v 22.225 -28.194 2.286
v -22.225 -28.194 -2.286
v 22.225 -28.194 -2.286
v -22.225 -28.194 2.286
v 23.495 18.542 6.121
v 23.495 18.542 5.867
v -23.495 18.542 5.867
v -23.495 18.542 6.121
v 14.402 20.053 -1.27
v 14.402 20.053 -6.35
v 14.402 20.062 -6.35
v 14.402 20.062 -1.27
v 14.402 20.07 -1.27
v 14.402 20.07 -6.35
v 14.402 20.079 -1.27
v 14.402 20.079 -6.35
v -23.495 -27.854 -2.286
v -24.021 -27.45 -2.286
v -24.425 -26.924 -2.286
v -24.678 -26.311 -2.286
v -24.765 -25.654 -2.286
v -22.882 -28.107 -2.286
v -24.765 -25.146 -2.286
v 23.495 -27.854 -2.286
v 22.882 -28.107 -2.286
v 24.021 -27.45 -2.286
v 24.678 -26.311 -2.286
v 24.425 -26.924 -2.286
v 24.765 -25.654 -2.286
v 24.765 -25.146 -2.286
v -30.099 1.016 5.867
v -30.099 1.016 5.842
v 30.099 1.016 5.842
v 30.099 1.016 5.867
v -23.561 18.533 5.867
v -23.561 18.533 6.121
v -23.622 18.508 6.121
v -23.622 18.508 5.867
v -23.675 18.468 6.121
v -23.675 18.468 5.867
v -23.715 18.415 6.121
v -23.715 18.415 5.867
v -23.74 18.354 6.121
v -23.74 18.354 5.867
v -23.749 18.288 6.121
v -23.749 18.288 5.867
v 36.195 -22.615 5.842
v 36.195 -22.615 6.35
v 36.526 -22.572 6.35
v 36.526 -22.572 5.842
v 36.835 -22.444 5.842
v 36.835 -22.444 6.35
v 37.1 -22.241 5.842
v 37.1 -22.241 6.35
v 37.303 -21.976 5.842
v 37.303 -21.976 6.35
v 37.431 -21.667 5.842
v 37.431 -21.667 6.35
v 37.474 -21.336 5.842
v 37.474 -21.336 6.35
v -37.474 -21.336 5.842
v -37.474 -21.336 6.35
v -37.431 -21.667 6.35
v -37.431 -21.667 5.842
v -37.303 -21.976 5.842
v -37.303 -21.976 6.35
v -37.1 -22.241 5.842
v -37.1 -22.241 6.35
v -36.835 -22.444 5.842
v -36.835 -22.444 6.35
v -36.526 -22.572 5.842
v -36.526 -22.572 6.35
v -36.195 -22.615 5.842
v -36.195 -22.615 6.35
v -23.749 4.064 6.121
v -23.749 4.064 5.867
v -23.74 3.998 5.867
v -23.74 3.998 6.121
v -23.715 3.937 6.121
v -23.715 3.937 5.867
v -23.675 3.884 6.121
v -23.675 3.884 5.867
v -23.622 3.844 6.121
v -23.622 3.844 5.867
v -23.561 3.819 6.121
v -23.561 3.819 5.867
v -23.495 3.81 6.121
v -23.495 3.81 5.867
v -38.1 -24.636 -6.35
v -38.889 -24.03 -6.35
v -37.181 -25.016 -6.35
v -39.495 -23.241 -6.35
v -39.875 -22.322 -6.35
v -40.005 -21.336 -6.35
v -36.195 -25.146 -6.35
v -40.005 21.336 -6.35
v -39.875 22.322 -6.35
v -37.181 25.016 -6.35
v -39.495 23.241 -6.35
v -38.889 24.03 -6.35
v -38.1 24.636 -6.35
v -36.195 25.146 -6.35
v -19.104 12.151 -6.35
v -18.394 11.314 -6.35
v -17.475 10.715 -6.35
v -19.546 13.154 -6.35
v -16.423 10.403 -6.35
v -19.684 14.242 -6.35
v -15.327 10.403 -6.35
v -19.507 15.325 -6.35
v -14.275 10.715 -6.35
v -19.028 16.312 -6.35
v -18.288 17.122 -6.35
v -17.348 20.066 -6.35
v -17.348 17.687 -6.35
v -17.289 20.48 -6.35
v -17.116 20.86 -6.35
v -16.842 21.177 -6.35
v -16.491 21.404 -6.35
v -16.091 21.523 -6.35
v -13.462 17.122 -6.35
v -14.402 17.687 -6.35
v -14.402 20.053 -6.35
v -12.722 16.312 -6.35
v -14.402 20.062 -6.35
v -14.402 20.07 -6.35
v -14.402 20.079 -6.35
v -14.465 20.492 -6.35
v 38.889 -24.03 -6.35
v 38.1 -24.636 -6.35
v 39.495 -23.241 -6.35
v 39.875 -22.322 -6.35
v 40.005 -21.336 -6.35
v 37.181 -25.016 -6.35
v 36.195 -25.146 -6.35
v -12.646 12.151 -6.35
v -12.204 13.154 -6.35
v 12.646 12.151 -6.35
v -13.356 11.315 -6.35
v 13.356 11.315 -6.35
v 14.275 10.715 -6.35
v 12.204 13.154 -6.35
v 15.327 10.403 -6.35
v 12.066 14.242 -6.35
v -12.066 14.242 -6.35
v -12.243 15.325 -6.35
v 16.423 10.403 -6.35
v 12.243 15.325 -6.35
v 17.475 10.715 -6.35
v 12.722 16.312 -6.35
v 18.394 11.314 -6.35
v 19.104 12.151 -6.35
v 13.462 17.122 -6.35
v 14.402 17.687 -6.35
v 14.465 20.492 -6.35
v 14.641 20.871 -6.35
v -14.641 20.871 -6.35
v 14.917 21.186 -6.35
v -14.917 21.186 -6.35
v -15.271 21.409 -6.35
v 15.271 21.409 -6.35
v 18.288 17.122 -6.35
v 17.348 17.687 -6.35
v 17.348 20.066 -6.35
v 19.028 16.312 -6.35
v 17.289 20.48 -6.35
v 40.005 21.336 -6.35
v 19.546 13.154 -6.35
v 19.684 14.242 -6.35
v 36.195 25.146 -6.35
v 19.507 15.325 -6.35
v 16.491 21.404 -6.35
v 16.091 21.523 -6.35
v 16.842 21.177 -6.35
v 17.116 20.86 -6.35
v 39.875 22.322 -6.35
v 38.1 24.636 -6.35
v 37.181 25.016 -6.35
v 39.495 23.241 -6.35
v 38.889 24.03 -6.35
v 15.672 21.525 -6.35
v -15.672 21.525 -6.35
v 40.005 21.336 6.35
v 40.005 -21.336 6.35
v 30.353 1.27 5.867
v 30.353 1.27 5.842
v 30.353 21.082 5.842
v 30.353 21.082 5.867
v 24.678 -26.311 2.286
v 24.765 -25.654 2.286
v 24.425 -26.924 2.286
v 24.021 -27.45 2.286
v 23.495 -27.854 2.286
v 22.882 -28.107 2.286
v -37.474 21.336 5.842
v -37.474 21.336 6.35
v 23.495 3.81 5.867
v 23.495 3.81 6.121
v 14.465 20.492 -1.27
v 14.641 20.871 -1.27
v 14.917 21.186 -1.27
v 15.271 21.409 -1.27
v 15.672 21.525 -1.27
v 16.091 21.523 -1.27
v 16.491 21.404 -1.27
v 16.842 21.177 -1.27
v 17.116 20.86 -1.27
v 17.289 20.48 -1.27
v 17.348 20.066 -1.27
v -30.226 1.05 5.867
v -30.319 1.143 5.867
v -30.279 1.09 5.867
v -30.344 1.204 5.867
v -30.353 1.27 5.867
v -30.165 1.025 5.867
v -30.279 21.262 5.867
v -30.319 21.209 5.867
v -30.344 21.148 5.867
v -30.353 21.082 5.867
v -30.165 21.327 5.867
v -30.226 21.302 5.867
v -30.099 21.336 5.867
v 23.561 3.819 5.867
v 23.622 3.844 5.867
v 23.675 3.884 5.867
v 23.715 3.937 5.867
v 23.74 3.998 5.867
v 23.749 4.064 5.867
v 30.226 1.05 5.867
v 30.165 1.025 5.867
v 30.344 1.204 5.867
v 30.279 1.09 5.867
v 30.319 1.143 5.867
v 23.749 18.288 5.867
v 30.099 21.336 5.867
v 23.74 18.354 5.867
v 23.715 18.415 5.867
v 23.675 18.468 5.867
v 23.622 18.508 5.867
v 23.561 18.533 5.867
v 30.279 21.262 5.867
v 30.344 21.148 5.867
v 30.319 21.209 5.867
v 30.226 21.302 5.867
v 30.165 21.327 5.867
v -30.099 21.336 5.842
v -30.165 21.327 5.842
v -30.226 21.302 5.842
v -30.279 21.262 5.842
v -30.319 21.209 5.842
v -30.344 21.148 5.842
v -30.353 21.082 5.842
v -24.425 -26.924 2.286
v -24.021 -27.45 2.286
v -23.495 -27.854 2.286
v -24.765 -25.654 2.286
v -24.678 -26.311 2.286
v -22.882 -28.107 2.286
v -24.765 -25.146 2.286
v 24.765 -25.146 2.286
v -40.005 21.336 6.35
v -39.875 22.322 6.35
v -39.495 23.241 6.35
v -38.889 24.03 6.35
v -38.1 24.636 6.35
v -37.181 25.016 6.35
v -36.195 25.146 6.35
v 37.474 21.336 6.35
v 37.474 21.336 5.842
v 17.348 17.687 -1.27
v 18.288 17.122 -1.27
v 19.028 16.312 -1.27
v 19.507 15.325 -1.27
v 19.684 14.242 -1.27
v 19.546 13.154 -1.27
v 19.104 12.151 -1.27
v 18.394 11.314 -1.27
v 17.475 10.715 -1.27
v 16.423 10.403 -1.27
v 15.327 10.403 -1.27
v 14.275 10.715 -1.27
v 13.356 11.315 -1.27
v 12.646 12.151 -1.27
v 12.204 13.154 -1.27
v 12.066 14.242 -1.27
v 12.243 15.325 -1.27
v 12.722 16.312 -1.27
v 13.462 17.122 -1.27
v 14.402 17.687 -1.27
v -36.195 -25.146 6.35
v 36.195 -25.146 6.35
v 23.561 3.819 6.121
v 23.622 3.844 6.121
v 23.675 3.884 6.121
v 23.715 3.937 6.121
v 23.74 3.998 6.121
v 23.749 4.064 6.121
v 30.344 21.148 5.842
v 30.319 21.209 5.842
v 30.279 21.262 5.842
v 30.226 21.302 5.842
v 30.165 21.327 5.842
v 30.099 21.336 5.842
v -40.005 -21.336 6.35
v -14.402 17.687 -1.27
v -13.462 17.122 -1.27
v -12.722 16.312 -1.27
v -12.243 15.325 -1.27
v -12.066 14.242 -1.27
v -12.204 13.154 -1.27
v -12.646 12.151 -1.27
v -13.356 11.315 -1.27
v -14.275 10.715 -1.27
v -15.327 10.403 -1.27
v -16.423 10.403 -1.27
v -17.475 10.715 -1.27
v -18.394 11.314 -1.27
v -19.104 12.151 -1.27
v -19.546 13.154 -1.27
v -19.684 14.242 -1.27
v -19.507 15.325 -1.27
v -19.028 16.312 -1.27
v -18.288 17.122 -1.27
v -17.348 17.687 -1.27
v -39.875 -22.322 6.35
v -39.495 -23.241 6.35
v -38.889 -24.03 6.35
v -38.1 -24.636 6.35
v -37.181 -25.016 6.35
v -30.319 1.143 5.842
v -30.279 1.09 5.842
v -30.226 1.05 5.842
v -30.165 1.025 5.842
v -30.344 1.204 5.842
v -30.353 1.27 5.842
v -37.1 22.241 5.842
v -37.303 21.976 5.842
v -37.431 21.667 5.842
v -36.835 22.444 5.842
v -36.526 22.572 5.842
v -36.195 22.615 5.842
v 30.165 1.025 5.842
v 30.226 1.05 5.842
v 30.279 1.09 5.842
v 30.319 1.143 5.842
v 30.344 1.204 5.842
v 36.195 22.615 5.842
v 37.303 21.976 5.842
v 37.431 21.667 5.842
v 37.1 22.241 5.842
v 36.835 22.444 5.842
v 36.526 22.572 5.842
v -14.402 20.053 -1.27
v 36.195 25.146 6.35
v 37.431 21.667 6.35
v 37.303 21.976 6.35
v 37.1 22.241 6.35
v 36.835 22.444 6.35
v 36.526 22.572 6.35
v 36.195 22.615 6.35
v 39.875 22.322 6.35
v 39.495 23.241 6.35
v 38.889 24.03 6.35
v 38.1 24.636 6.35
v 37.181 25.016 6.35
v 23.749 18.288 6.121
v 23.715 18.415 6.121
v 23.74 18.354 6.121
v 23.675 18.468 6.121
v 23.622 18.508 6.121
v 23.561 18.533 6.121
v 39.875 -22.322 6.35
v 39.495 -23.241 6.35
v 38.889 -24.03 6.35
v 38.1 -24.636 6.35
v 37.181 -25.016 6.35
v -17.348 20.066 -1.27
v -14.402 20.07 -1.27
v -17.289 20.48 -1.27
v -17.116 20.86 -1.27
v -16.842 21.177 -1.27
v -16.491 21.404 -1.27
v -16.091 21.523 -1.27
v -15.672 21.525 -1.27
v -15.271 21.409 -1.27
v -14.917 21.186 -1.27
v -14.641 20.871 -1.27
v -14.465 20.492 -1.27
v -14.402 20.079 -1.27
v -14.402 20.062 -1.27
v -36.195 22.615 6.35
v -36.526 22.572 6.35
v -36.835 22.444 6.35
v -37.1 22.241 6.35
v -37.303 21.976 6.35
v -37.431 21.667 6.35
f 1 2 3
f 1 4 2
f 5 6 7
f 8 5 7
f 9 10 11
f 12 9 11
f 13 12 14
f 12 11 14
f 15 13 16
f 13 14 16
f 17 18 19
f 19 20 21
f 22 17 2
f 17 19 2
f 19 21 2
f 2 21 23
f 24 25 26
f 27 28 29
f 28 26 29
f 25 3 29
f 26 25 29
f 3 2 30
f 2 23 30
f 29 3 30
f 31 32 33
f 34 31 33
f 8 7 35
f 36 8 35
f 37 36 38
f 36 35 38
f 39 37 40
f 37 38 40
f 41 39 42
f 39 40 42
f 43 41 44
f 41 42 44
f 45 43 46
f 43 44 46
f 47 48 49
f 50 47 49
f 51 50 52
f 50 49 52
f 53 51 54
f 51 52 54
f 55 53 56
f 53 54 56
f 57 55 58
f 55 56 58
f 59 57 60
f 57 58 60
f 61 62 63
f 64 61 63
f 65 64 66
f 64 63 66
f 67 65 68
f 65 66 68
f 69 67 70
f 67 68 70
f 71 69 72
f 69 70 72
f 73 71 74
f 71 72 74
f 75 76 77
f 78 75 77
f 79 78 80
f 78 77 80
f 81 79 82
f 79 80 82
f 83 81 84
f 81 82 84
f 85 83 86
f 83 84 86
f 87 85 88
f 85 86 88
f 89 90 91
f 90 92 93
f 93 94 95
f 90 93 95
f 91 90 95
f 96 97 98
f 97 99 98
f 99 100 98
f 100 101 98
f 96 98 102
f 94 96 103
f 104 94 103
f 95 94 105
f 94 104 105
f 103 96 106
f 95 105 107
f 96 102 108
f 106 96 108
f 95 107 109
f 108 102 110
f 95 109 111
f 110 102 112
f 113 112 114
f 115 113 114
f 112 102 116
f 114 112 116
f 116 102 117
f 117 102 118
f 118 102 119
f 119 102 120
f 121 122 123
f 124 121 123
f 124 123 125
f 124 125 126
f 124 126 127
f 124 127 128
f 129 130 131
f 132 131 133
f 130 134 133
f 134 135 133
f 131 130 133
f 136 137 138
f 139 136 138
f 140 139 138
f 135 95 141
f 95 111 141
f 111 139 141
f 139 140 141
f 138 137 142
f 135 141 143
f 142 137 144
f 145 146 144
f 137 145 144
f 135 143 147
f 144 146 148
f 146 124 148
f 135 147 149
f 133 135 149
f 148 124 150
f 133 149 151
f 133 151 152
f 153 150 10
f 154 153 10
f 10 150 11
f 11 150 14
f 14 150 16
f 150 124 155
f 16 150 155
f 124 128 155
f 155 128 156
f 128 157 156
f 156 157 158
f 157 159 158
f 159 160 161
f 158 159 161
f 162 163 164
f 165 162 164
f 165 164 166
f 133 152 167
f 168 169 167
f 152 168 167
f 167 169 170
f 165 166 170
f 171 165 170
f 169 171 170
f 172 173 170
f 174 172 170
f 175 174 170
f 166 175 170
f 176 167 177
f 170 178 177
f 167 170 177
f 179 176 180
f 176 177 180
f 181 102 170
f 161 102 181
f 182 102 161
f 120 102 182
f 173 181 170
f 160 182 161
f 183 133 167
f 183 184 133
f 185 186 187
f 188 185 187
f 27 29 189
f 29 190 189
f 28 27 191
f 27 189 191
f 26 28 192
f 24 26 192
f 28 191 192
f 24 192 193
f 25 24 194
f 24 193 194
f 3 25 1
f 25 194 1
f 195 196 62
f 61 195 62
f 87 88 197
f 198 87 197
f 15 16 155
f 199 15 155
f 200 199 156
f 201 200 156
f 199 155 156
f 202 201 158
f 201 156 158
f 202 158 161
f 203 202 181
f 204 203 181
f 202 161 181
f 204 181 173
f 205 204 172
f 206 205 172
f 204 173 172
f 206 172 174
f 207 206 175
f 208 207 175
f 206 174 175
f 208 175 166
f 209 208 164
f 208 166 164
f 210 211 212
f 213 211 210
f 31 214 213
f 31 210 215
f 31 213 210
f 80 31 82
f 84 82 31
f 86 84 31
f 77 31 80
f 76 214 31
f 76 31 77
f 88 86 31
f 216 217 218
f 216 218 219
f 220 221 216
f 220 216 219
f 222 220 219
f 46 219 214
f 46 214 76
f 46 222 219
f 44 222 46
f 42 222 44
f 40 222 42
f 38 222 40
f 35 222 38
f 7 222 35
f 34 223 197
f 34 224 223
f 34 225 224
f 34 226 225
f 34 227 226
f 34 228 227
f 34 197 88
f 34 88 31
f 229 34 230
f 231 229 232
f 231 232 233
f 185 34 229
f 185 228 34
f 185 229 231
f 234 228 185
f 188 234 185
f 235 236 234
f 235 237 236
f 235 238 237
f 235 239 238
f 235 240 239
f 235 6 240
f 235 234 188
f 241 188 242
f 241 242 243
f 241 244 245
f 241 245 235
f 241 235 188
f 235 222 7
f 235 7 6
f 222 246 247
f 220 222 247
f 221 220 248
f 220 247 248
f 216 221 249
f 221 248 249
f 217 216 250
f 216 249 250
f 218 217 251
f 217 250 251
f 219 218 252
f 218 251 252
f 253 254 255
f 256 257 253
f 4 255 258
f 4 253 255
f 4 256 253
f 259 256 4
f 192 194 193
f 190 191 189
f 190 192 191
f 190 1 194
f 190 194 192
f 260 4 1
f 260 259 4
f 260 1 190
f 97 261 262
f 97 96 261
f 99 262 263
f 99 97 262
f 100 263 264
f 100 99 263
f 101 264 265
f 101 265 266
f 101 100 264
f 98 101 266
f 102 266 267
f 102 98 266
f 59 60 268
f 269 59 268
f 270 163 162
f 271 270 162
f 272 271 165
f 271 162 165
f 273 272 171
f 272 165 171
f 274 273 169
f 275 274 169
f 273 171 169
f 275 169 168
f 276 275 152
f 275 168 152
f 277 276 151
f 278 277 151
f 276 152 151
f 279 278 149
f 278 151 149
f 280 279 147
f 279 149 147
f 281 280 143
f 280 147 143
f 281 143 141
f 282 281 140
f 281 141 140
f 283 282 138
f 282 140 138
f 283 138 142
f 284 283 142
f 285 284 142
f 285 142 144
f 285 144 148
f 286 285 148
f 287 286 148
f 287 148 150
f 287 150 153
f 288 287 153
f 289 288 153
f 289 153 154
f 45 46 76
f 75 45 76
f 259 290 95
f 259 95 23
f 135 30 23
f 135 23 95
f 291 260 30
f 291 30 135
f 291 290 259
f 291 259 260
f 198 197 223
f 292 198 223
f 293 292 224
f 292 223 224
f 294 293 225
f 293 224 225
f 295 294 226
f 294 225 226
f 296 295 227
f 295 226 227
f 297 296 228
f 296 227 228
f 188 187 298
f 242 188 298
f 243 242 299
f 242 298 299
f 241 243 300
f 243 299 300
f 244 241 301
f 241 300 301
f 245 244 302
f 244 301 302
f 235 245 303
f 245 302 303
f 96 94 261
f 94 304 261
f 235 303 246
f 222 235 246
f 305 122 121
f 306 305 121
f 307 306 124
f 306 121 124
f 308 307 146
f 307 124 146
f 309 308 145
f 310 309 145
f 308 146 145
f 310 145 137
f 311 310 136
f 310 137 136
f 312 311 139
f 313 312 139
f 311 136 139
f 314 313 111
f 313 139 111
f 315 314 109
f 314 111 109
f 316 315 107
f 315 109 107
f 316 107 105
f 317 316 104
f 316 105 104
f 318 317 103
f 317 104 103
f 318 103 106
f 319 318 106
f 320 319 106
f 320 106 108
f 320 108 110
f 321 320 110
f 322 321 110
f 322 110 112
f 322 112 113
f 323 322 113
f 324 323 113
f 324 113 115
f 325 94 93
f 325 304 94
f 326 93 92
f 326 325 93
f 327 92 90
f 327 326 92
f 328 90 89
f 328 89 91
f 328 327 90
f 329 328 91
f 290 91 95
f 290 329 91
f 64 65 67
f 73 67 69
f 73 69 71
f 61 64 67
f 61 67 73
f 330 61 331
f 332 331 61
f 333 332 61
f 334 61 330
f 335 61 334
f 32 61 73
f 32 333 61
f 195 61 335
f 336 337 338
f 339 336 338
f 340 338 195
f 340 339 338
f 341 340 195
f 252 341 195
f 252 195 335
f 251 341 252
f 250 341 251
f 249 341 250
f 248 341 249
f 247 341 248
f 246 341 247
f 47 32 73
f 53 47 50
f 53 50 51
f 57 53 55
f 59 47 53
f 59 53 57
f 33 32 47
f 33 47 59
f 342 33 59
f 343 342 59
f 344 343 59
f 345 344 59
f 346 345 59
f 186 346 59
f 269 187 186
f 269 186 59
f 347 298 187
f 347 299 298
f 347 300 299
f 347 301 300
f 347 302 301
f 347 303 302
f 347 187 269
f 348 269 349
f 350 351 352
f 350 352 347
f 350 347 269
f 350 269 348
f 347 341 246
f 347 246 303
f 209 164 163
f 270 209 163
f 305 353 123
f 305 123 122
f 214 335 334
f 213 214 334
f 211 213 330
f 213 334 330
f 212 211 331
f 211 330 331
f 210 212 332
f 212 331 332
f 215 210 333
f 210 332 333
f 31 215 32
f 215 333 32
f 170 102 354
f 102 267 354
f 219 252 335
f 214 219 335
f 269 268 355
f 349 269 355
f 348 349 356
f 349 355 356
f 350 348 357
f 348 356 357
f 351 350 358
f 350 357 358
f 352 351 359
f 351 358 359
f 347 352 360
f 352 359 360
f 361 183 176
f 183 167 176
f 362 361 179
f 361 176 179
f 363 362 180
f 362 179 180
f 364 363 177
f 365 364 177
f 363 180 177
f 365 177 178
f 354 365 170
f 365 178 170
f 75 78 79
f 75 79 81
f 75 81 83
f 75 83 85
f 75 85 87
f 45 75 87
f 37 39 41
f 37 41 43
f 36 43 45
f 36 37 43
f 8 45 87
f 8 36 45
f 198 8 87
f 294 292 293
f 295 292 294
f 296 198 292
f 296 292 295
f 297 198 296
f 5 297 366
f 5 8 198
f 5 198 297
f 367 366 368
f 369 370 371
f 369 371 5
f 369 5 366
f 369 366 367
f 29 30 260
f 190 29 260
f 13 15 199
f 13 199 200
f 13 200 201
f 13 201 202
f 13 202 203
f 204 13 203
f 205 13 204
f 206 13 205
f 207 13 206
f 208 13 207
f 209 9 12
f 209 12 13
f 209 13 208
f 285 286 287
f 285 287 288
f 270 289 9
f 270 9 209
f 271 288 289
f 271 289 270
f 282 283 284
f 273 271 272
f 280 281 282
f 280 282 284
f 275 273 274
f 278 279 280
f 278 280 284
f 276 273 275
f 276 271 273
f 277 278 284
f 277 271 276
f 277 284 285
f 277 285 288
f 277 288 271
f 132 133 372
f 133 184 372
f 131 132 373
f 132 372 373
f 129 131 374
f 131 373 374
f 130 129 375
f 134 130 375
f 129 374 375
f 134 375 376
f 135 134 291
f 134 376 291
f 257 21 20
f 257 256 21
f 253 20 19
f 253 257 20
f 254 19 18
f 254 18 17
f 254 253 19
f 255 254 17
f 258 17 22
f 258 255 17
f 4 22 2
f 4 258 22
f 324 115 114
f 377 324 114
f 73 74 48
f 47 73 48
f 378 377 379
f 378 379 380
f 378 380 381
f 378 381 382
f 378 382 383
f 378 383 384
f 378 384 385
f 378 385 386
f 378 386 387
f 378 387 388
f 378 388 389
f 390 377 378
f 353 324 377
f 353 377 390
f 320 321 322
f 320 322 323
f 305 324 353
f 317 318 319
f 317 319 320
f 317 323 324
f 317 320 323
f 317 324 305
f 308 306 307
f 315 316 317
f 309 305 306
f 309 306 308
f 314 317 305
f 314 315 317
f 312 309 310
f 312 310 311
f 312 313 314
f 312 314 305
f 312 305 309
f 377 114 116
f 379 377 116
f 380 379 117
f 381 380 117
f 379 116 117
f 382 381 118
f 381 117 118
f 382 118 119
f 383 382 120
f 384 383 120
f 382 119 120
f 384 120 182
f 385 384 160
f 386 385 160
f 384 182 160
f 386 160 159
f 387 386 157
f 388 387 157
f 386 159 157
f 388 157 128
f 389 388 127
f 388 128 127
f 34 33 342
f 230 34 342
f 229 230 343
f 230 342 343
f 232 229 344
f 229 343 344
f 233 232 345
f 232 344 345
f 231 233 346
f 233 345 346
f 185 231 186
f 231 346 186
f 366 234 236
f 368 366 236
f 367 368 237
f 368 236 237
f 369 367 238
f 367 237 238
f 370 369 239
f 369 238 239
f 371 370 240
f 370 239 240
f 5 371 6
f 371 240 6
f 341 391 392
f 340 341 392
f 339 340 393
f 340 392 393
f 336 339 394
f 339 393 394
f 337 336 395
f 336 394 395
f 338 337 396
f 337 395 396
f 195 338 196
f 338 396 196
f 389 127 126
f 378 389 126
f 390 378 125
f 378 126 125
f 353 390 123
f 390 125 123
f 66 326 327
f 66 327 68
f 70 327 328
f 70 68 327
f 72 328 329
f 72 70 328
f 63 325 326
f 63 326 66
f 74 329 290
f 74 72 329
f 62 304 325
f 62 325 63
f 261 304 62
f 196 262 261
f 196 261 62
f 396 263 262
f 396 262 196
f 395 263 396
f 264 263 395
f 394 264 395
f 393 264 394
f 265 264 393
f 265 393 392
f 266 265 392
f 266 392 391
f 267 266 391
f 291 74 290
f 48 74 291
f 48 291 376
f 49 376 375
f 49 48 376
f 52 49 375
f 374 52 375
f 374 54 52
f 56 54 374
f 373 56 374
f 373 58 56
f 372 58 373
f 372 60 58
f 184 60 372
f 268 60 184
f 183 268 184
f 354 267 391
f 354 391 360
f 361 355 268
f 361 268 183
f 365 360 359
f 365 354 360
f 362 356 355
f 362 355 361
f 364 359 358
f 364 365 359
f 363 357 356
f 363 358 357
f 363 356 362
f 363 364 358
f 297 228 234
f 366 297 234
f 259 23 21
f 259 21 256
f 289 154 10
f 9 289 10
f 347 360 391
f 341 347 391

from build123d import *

# Parameters (mm, degrees)
F0_W      = 80.01
F0_H      = 50.292
F1_DEPTH  = 6.35
F2_R      = 3.81
F4_DEPTH  = 0.508
F5_W      = 49.53
F5_H      = 4.572
F6_DEPTH  = 3.048
F7_R      = 2.54
F9_DEPTH  = 0.0254
F11_DEPTH = 0.254
F13_DEPTH = 5.08


with BuildPart() as f1:
    # F0 (on Top) → F1 (new body, symmetric)
    with BuildSketch(Plane.XY):
        Rectangle(F0_W, F0_H)
    extrude(amount=F1_DEPTH, both=True)

    # F2
    f2_edges = [f1.edges().sort_by_distance(p)[0] for p in [
        (-40.005, -25.146, 0),
        (40.005, -25.146, 0),
        (40.005, 25.146, 0),
        (-40.005, 25.146, 0),
    ]]
    fillet(f2_edges, radius=F2_R)

    # F3 (on face) → F4 (cut)
    with BuildSketch(Plane.XY.offset(6.35)):
        with BuildLine():
            ThreePointArc((37.474391, 21.336), (37.099666, 22.240666), (36.195, 22.615391))
            Line((36.195, 22.615391), (-36.195, 22.615391))
            ThreePointArc((-36.195, 22.615391), (-37.099666, 22.240666), (-37.474391, 21.336))
            Line((-37.474391, 21.336), (-37.474391, -21.336))
            ThreePointArc((-37.474391, -21.336), (-37.099666, -22.240666), (-36.195, -22.615391))
            Line((-36.195, -22.615391), (36.195, -22.615391))
            ThreePointArc((36.195, -22.615391), (37.099666, -22.240666), (37.474391, -21.336))
            Line((37.474391, -21.336), (37.474391, 21.336))
        make_face()
    extrude(amount=-F4_DEPTH, mode=Mode.SUBTRACT)

    # F5 (on face) → F6 (join)
    with BuildSketch(Plane.XZ.offset(25.146)):
        Rectangle(F5_W, F5_H)
    extrude(amount=F6_DEPTH)

    # F7
    f7_edges = [f1.edges().sort_by_distance(p)[0] for p in [
        (24.765, -28.194, 0),
        (-24.765, -28.194, 0),
    ]]
    fillet(f7_edges, radius=F7_R)

    # F8 (on face) → F9 (join)
    with BuildSketch(Plane.XY.offset(5.842)):
        with BuildLine():
            Line((30.099, 21.336), (-30.099, 21.336))
            ThreePointArc((-30.099, 21.336), (-30.278605, 21.261605), (-30.353, 21.082))
            Line((-30.353, 21.082), (-30.353, 1.27))
            ThreePointArc((-30.353, 1.27), (-30.278605, 1.090395), (-30.099, 1.016))
            Line((-30.099, 1.016), (30.099, 1.016))
            ThreePointArc((30.099, 1.016), (30.278605, 1.090395), (30.353, 1.27))
            Line((30.353, 1.27), (30.353, 21.082))
            ThreePointArc((30.353, 21.082), (30.278605, 21.261605), (30.099, 21.336))
        make_face()
    extrude(amount=F9_DEPTH)

    # F10 (on face) → F11 (join)
    with BuildSketch(Plane.XY.offset(5.8674)):
        with BuildLine():
            Line((23.495, 18.542), (-23.495, 18.542))
            ThreePointArc((-23.495, 18.542), (-23.674605, 18.467605), (-23.749, 18.288))
            Line((-23.749, 18.288), (-23.749, 4.064))
            ThreePointArc((-23.749, 4.064), (-23.674605, 3.884395), (-23.495, 3.81))
            Line((-23.495, 3.81), (23.495, 3.81))
            ThreePointArc((23.495, 3.81), (23.674605, 3.884395), (23.749, 4.064))
            Line((23.749, 4.064), (23.749, 18.288))
            ThreePointArc((23.749, 18.288), (23.674605, 18.467605), (23.495, 18.542))
        make_face()
    extrude(amount=F11_DEPTH)

    # F12 (on face) → F13 (cut)
    with BuildSketch(Plane(origin=(0, 0, -6.35), x_dir=(1, 0, 0), z_dir=(0, 0, -1))):
        with BuildLine():
            Line((14.401857, -17.68688), (14.401857, -20.053012))
            ThreePointArc((14.401857, -20.053012), (14.4018, -20.066), (14.401857, -20.078988))
            ThreePointArc((14.401857, -20.078988), (15.881494, -21.539186), (17.3482, -20.066))
            Line((17.3482, -20.066), (17.3482, -17.686856))
            ThreePointArc((17.3482, -17.686856), (15.874969, -10.3632), (14.401857, -17.68688))
        make_face()
        with BuildLine():
            ThreePointArc((-14.401857, -17.68688), (-15.874969, -10.3632), (-17.3482, -17.686856))
            Line((-17.3482, -17.686856), (-17.3482, -20.066))
            ThreePointArc((-17.3482, -20.066), (-15.881494, -21.539186), (-14.401857, -20.078988))
            ThreePointArc((-14.401857, -20.078988), (-14.4018, -20.066), (-14.401857, -20.053012))
            Line((-14.401857, -20.053012), (-14.401857, -17.68688))
        make_face()
    extrude(amount=-F13_DEPTH, mode=Mode.SUBTRACT)


solid = f1.part
